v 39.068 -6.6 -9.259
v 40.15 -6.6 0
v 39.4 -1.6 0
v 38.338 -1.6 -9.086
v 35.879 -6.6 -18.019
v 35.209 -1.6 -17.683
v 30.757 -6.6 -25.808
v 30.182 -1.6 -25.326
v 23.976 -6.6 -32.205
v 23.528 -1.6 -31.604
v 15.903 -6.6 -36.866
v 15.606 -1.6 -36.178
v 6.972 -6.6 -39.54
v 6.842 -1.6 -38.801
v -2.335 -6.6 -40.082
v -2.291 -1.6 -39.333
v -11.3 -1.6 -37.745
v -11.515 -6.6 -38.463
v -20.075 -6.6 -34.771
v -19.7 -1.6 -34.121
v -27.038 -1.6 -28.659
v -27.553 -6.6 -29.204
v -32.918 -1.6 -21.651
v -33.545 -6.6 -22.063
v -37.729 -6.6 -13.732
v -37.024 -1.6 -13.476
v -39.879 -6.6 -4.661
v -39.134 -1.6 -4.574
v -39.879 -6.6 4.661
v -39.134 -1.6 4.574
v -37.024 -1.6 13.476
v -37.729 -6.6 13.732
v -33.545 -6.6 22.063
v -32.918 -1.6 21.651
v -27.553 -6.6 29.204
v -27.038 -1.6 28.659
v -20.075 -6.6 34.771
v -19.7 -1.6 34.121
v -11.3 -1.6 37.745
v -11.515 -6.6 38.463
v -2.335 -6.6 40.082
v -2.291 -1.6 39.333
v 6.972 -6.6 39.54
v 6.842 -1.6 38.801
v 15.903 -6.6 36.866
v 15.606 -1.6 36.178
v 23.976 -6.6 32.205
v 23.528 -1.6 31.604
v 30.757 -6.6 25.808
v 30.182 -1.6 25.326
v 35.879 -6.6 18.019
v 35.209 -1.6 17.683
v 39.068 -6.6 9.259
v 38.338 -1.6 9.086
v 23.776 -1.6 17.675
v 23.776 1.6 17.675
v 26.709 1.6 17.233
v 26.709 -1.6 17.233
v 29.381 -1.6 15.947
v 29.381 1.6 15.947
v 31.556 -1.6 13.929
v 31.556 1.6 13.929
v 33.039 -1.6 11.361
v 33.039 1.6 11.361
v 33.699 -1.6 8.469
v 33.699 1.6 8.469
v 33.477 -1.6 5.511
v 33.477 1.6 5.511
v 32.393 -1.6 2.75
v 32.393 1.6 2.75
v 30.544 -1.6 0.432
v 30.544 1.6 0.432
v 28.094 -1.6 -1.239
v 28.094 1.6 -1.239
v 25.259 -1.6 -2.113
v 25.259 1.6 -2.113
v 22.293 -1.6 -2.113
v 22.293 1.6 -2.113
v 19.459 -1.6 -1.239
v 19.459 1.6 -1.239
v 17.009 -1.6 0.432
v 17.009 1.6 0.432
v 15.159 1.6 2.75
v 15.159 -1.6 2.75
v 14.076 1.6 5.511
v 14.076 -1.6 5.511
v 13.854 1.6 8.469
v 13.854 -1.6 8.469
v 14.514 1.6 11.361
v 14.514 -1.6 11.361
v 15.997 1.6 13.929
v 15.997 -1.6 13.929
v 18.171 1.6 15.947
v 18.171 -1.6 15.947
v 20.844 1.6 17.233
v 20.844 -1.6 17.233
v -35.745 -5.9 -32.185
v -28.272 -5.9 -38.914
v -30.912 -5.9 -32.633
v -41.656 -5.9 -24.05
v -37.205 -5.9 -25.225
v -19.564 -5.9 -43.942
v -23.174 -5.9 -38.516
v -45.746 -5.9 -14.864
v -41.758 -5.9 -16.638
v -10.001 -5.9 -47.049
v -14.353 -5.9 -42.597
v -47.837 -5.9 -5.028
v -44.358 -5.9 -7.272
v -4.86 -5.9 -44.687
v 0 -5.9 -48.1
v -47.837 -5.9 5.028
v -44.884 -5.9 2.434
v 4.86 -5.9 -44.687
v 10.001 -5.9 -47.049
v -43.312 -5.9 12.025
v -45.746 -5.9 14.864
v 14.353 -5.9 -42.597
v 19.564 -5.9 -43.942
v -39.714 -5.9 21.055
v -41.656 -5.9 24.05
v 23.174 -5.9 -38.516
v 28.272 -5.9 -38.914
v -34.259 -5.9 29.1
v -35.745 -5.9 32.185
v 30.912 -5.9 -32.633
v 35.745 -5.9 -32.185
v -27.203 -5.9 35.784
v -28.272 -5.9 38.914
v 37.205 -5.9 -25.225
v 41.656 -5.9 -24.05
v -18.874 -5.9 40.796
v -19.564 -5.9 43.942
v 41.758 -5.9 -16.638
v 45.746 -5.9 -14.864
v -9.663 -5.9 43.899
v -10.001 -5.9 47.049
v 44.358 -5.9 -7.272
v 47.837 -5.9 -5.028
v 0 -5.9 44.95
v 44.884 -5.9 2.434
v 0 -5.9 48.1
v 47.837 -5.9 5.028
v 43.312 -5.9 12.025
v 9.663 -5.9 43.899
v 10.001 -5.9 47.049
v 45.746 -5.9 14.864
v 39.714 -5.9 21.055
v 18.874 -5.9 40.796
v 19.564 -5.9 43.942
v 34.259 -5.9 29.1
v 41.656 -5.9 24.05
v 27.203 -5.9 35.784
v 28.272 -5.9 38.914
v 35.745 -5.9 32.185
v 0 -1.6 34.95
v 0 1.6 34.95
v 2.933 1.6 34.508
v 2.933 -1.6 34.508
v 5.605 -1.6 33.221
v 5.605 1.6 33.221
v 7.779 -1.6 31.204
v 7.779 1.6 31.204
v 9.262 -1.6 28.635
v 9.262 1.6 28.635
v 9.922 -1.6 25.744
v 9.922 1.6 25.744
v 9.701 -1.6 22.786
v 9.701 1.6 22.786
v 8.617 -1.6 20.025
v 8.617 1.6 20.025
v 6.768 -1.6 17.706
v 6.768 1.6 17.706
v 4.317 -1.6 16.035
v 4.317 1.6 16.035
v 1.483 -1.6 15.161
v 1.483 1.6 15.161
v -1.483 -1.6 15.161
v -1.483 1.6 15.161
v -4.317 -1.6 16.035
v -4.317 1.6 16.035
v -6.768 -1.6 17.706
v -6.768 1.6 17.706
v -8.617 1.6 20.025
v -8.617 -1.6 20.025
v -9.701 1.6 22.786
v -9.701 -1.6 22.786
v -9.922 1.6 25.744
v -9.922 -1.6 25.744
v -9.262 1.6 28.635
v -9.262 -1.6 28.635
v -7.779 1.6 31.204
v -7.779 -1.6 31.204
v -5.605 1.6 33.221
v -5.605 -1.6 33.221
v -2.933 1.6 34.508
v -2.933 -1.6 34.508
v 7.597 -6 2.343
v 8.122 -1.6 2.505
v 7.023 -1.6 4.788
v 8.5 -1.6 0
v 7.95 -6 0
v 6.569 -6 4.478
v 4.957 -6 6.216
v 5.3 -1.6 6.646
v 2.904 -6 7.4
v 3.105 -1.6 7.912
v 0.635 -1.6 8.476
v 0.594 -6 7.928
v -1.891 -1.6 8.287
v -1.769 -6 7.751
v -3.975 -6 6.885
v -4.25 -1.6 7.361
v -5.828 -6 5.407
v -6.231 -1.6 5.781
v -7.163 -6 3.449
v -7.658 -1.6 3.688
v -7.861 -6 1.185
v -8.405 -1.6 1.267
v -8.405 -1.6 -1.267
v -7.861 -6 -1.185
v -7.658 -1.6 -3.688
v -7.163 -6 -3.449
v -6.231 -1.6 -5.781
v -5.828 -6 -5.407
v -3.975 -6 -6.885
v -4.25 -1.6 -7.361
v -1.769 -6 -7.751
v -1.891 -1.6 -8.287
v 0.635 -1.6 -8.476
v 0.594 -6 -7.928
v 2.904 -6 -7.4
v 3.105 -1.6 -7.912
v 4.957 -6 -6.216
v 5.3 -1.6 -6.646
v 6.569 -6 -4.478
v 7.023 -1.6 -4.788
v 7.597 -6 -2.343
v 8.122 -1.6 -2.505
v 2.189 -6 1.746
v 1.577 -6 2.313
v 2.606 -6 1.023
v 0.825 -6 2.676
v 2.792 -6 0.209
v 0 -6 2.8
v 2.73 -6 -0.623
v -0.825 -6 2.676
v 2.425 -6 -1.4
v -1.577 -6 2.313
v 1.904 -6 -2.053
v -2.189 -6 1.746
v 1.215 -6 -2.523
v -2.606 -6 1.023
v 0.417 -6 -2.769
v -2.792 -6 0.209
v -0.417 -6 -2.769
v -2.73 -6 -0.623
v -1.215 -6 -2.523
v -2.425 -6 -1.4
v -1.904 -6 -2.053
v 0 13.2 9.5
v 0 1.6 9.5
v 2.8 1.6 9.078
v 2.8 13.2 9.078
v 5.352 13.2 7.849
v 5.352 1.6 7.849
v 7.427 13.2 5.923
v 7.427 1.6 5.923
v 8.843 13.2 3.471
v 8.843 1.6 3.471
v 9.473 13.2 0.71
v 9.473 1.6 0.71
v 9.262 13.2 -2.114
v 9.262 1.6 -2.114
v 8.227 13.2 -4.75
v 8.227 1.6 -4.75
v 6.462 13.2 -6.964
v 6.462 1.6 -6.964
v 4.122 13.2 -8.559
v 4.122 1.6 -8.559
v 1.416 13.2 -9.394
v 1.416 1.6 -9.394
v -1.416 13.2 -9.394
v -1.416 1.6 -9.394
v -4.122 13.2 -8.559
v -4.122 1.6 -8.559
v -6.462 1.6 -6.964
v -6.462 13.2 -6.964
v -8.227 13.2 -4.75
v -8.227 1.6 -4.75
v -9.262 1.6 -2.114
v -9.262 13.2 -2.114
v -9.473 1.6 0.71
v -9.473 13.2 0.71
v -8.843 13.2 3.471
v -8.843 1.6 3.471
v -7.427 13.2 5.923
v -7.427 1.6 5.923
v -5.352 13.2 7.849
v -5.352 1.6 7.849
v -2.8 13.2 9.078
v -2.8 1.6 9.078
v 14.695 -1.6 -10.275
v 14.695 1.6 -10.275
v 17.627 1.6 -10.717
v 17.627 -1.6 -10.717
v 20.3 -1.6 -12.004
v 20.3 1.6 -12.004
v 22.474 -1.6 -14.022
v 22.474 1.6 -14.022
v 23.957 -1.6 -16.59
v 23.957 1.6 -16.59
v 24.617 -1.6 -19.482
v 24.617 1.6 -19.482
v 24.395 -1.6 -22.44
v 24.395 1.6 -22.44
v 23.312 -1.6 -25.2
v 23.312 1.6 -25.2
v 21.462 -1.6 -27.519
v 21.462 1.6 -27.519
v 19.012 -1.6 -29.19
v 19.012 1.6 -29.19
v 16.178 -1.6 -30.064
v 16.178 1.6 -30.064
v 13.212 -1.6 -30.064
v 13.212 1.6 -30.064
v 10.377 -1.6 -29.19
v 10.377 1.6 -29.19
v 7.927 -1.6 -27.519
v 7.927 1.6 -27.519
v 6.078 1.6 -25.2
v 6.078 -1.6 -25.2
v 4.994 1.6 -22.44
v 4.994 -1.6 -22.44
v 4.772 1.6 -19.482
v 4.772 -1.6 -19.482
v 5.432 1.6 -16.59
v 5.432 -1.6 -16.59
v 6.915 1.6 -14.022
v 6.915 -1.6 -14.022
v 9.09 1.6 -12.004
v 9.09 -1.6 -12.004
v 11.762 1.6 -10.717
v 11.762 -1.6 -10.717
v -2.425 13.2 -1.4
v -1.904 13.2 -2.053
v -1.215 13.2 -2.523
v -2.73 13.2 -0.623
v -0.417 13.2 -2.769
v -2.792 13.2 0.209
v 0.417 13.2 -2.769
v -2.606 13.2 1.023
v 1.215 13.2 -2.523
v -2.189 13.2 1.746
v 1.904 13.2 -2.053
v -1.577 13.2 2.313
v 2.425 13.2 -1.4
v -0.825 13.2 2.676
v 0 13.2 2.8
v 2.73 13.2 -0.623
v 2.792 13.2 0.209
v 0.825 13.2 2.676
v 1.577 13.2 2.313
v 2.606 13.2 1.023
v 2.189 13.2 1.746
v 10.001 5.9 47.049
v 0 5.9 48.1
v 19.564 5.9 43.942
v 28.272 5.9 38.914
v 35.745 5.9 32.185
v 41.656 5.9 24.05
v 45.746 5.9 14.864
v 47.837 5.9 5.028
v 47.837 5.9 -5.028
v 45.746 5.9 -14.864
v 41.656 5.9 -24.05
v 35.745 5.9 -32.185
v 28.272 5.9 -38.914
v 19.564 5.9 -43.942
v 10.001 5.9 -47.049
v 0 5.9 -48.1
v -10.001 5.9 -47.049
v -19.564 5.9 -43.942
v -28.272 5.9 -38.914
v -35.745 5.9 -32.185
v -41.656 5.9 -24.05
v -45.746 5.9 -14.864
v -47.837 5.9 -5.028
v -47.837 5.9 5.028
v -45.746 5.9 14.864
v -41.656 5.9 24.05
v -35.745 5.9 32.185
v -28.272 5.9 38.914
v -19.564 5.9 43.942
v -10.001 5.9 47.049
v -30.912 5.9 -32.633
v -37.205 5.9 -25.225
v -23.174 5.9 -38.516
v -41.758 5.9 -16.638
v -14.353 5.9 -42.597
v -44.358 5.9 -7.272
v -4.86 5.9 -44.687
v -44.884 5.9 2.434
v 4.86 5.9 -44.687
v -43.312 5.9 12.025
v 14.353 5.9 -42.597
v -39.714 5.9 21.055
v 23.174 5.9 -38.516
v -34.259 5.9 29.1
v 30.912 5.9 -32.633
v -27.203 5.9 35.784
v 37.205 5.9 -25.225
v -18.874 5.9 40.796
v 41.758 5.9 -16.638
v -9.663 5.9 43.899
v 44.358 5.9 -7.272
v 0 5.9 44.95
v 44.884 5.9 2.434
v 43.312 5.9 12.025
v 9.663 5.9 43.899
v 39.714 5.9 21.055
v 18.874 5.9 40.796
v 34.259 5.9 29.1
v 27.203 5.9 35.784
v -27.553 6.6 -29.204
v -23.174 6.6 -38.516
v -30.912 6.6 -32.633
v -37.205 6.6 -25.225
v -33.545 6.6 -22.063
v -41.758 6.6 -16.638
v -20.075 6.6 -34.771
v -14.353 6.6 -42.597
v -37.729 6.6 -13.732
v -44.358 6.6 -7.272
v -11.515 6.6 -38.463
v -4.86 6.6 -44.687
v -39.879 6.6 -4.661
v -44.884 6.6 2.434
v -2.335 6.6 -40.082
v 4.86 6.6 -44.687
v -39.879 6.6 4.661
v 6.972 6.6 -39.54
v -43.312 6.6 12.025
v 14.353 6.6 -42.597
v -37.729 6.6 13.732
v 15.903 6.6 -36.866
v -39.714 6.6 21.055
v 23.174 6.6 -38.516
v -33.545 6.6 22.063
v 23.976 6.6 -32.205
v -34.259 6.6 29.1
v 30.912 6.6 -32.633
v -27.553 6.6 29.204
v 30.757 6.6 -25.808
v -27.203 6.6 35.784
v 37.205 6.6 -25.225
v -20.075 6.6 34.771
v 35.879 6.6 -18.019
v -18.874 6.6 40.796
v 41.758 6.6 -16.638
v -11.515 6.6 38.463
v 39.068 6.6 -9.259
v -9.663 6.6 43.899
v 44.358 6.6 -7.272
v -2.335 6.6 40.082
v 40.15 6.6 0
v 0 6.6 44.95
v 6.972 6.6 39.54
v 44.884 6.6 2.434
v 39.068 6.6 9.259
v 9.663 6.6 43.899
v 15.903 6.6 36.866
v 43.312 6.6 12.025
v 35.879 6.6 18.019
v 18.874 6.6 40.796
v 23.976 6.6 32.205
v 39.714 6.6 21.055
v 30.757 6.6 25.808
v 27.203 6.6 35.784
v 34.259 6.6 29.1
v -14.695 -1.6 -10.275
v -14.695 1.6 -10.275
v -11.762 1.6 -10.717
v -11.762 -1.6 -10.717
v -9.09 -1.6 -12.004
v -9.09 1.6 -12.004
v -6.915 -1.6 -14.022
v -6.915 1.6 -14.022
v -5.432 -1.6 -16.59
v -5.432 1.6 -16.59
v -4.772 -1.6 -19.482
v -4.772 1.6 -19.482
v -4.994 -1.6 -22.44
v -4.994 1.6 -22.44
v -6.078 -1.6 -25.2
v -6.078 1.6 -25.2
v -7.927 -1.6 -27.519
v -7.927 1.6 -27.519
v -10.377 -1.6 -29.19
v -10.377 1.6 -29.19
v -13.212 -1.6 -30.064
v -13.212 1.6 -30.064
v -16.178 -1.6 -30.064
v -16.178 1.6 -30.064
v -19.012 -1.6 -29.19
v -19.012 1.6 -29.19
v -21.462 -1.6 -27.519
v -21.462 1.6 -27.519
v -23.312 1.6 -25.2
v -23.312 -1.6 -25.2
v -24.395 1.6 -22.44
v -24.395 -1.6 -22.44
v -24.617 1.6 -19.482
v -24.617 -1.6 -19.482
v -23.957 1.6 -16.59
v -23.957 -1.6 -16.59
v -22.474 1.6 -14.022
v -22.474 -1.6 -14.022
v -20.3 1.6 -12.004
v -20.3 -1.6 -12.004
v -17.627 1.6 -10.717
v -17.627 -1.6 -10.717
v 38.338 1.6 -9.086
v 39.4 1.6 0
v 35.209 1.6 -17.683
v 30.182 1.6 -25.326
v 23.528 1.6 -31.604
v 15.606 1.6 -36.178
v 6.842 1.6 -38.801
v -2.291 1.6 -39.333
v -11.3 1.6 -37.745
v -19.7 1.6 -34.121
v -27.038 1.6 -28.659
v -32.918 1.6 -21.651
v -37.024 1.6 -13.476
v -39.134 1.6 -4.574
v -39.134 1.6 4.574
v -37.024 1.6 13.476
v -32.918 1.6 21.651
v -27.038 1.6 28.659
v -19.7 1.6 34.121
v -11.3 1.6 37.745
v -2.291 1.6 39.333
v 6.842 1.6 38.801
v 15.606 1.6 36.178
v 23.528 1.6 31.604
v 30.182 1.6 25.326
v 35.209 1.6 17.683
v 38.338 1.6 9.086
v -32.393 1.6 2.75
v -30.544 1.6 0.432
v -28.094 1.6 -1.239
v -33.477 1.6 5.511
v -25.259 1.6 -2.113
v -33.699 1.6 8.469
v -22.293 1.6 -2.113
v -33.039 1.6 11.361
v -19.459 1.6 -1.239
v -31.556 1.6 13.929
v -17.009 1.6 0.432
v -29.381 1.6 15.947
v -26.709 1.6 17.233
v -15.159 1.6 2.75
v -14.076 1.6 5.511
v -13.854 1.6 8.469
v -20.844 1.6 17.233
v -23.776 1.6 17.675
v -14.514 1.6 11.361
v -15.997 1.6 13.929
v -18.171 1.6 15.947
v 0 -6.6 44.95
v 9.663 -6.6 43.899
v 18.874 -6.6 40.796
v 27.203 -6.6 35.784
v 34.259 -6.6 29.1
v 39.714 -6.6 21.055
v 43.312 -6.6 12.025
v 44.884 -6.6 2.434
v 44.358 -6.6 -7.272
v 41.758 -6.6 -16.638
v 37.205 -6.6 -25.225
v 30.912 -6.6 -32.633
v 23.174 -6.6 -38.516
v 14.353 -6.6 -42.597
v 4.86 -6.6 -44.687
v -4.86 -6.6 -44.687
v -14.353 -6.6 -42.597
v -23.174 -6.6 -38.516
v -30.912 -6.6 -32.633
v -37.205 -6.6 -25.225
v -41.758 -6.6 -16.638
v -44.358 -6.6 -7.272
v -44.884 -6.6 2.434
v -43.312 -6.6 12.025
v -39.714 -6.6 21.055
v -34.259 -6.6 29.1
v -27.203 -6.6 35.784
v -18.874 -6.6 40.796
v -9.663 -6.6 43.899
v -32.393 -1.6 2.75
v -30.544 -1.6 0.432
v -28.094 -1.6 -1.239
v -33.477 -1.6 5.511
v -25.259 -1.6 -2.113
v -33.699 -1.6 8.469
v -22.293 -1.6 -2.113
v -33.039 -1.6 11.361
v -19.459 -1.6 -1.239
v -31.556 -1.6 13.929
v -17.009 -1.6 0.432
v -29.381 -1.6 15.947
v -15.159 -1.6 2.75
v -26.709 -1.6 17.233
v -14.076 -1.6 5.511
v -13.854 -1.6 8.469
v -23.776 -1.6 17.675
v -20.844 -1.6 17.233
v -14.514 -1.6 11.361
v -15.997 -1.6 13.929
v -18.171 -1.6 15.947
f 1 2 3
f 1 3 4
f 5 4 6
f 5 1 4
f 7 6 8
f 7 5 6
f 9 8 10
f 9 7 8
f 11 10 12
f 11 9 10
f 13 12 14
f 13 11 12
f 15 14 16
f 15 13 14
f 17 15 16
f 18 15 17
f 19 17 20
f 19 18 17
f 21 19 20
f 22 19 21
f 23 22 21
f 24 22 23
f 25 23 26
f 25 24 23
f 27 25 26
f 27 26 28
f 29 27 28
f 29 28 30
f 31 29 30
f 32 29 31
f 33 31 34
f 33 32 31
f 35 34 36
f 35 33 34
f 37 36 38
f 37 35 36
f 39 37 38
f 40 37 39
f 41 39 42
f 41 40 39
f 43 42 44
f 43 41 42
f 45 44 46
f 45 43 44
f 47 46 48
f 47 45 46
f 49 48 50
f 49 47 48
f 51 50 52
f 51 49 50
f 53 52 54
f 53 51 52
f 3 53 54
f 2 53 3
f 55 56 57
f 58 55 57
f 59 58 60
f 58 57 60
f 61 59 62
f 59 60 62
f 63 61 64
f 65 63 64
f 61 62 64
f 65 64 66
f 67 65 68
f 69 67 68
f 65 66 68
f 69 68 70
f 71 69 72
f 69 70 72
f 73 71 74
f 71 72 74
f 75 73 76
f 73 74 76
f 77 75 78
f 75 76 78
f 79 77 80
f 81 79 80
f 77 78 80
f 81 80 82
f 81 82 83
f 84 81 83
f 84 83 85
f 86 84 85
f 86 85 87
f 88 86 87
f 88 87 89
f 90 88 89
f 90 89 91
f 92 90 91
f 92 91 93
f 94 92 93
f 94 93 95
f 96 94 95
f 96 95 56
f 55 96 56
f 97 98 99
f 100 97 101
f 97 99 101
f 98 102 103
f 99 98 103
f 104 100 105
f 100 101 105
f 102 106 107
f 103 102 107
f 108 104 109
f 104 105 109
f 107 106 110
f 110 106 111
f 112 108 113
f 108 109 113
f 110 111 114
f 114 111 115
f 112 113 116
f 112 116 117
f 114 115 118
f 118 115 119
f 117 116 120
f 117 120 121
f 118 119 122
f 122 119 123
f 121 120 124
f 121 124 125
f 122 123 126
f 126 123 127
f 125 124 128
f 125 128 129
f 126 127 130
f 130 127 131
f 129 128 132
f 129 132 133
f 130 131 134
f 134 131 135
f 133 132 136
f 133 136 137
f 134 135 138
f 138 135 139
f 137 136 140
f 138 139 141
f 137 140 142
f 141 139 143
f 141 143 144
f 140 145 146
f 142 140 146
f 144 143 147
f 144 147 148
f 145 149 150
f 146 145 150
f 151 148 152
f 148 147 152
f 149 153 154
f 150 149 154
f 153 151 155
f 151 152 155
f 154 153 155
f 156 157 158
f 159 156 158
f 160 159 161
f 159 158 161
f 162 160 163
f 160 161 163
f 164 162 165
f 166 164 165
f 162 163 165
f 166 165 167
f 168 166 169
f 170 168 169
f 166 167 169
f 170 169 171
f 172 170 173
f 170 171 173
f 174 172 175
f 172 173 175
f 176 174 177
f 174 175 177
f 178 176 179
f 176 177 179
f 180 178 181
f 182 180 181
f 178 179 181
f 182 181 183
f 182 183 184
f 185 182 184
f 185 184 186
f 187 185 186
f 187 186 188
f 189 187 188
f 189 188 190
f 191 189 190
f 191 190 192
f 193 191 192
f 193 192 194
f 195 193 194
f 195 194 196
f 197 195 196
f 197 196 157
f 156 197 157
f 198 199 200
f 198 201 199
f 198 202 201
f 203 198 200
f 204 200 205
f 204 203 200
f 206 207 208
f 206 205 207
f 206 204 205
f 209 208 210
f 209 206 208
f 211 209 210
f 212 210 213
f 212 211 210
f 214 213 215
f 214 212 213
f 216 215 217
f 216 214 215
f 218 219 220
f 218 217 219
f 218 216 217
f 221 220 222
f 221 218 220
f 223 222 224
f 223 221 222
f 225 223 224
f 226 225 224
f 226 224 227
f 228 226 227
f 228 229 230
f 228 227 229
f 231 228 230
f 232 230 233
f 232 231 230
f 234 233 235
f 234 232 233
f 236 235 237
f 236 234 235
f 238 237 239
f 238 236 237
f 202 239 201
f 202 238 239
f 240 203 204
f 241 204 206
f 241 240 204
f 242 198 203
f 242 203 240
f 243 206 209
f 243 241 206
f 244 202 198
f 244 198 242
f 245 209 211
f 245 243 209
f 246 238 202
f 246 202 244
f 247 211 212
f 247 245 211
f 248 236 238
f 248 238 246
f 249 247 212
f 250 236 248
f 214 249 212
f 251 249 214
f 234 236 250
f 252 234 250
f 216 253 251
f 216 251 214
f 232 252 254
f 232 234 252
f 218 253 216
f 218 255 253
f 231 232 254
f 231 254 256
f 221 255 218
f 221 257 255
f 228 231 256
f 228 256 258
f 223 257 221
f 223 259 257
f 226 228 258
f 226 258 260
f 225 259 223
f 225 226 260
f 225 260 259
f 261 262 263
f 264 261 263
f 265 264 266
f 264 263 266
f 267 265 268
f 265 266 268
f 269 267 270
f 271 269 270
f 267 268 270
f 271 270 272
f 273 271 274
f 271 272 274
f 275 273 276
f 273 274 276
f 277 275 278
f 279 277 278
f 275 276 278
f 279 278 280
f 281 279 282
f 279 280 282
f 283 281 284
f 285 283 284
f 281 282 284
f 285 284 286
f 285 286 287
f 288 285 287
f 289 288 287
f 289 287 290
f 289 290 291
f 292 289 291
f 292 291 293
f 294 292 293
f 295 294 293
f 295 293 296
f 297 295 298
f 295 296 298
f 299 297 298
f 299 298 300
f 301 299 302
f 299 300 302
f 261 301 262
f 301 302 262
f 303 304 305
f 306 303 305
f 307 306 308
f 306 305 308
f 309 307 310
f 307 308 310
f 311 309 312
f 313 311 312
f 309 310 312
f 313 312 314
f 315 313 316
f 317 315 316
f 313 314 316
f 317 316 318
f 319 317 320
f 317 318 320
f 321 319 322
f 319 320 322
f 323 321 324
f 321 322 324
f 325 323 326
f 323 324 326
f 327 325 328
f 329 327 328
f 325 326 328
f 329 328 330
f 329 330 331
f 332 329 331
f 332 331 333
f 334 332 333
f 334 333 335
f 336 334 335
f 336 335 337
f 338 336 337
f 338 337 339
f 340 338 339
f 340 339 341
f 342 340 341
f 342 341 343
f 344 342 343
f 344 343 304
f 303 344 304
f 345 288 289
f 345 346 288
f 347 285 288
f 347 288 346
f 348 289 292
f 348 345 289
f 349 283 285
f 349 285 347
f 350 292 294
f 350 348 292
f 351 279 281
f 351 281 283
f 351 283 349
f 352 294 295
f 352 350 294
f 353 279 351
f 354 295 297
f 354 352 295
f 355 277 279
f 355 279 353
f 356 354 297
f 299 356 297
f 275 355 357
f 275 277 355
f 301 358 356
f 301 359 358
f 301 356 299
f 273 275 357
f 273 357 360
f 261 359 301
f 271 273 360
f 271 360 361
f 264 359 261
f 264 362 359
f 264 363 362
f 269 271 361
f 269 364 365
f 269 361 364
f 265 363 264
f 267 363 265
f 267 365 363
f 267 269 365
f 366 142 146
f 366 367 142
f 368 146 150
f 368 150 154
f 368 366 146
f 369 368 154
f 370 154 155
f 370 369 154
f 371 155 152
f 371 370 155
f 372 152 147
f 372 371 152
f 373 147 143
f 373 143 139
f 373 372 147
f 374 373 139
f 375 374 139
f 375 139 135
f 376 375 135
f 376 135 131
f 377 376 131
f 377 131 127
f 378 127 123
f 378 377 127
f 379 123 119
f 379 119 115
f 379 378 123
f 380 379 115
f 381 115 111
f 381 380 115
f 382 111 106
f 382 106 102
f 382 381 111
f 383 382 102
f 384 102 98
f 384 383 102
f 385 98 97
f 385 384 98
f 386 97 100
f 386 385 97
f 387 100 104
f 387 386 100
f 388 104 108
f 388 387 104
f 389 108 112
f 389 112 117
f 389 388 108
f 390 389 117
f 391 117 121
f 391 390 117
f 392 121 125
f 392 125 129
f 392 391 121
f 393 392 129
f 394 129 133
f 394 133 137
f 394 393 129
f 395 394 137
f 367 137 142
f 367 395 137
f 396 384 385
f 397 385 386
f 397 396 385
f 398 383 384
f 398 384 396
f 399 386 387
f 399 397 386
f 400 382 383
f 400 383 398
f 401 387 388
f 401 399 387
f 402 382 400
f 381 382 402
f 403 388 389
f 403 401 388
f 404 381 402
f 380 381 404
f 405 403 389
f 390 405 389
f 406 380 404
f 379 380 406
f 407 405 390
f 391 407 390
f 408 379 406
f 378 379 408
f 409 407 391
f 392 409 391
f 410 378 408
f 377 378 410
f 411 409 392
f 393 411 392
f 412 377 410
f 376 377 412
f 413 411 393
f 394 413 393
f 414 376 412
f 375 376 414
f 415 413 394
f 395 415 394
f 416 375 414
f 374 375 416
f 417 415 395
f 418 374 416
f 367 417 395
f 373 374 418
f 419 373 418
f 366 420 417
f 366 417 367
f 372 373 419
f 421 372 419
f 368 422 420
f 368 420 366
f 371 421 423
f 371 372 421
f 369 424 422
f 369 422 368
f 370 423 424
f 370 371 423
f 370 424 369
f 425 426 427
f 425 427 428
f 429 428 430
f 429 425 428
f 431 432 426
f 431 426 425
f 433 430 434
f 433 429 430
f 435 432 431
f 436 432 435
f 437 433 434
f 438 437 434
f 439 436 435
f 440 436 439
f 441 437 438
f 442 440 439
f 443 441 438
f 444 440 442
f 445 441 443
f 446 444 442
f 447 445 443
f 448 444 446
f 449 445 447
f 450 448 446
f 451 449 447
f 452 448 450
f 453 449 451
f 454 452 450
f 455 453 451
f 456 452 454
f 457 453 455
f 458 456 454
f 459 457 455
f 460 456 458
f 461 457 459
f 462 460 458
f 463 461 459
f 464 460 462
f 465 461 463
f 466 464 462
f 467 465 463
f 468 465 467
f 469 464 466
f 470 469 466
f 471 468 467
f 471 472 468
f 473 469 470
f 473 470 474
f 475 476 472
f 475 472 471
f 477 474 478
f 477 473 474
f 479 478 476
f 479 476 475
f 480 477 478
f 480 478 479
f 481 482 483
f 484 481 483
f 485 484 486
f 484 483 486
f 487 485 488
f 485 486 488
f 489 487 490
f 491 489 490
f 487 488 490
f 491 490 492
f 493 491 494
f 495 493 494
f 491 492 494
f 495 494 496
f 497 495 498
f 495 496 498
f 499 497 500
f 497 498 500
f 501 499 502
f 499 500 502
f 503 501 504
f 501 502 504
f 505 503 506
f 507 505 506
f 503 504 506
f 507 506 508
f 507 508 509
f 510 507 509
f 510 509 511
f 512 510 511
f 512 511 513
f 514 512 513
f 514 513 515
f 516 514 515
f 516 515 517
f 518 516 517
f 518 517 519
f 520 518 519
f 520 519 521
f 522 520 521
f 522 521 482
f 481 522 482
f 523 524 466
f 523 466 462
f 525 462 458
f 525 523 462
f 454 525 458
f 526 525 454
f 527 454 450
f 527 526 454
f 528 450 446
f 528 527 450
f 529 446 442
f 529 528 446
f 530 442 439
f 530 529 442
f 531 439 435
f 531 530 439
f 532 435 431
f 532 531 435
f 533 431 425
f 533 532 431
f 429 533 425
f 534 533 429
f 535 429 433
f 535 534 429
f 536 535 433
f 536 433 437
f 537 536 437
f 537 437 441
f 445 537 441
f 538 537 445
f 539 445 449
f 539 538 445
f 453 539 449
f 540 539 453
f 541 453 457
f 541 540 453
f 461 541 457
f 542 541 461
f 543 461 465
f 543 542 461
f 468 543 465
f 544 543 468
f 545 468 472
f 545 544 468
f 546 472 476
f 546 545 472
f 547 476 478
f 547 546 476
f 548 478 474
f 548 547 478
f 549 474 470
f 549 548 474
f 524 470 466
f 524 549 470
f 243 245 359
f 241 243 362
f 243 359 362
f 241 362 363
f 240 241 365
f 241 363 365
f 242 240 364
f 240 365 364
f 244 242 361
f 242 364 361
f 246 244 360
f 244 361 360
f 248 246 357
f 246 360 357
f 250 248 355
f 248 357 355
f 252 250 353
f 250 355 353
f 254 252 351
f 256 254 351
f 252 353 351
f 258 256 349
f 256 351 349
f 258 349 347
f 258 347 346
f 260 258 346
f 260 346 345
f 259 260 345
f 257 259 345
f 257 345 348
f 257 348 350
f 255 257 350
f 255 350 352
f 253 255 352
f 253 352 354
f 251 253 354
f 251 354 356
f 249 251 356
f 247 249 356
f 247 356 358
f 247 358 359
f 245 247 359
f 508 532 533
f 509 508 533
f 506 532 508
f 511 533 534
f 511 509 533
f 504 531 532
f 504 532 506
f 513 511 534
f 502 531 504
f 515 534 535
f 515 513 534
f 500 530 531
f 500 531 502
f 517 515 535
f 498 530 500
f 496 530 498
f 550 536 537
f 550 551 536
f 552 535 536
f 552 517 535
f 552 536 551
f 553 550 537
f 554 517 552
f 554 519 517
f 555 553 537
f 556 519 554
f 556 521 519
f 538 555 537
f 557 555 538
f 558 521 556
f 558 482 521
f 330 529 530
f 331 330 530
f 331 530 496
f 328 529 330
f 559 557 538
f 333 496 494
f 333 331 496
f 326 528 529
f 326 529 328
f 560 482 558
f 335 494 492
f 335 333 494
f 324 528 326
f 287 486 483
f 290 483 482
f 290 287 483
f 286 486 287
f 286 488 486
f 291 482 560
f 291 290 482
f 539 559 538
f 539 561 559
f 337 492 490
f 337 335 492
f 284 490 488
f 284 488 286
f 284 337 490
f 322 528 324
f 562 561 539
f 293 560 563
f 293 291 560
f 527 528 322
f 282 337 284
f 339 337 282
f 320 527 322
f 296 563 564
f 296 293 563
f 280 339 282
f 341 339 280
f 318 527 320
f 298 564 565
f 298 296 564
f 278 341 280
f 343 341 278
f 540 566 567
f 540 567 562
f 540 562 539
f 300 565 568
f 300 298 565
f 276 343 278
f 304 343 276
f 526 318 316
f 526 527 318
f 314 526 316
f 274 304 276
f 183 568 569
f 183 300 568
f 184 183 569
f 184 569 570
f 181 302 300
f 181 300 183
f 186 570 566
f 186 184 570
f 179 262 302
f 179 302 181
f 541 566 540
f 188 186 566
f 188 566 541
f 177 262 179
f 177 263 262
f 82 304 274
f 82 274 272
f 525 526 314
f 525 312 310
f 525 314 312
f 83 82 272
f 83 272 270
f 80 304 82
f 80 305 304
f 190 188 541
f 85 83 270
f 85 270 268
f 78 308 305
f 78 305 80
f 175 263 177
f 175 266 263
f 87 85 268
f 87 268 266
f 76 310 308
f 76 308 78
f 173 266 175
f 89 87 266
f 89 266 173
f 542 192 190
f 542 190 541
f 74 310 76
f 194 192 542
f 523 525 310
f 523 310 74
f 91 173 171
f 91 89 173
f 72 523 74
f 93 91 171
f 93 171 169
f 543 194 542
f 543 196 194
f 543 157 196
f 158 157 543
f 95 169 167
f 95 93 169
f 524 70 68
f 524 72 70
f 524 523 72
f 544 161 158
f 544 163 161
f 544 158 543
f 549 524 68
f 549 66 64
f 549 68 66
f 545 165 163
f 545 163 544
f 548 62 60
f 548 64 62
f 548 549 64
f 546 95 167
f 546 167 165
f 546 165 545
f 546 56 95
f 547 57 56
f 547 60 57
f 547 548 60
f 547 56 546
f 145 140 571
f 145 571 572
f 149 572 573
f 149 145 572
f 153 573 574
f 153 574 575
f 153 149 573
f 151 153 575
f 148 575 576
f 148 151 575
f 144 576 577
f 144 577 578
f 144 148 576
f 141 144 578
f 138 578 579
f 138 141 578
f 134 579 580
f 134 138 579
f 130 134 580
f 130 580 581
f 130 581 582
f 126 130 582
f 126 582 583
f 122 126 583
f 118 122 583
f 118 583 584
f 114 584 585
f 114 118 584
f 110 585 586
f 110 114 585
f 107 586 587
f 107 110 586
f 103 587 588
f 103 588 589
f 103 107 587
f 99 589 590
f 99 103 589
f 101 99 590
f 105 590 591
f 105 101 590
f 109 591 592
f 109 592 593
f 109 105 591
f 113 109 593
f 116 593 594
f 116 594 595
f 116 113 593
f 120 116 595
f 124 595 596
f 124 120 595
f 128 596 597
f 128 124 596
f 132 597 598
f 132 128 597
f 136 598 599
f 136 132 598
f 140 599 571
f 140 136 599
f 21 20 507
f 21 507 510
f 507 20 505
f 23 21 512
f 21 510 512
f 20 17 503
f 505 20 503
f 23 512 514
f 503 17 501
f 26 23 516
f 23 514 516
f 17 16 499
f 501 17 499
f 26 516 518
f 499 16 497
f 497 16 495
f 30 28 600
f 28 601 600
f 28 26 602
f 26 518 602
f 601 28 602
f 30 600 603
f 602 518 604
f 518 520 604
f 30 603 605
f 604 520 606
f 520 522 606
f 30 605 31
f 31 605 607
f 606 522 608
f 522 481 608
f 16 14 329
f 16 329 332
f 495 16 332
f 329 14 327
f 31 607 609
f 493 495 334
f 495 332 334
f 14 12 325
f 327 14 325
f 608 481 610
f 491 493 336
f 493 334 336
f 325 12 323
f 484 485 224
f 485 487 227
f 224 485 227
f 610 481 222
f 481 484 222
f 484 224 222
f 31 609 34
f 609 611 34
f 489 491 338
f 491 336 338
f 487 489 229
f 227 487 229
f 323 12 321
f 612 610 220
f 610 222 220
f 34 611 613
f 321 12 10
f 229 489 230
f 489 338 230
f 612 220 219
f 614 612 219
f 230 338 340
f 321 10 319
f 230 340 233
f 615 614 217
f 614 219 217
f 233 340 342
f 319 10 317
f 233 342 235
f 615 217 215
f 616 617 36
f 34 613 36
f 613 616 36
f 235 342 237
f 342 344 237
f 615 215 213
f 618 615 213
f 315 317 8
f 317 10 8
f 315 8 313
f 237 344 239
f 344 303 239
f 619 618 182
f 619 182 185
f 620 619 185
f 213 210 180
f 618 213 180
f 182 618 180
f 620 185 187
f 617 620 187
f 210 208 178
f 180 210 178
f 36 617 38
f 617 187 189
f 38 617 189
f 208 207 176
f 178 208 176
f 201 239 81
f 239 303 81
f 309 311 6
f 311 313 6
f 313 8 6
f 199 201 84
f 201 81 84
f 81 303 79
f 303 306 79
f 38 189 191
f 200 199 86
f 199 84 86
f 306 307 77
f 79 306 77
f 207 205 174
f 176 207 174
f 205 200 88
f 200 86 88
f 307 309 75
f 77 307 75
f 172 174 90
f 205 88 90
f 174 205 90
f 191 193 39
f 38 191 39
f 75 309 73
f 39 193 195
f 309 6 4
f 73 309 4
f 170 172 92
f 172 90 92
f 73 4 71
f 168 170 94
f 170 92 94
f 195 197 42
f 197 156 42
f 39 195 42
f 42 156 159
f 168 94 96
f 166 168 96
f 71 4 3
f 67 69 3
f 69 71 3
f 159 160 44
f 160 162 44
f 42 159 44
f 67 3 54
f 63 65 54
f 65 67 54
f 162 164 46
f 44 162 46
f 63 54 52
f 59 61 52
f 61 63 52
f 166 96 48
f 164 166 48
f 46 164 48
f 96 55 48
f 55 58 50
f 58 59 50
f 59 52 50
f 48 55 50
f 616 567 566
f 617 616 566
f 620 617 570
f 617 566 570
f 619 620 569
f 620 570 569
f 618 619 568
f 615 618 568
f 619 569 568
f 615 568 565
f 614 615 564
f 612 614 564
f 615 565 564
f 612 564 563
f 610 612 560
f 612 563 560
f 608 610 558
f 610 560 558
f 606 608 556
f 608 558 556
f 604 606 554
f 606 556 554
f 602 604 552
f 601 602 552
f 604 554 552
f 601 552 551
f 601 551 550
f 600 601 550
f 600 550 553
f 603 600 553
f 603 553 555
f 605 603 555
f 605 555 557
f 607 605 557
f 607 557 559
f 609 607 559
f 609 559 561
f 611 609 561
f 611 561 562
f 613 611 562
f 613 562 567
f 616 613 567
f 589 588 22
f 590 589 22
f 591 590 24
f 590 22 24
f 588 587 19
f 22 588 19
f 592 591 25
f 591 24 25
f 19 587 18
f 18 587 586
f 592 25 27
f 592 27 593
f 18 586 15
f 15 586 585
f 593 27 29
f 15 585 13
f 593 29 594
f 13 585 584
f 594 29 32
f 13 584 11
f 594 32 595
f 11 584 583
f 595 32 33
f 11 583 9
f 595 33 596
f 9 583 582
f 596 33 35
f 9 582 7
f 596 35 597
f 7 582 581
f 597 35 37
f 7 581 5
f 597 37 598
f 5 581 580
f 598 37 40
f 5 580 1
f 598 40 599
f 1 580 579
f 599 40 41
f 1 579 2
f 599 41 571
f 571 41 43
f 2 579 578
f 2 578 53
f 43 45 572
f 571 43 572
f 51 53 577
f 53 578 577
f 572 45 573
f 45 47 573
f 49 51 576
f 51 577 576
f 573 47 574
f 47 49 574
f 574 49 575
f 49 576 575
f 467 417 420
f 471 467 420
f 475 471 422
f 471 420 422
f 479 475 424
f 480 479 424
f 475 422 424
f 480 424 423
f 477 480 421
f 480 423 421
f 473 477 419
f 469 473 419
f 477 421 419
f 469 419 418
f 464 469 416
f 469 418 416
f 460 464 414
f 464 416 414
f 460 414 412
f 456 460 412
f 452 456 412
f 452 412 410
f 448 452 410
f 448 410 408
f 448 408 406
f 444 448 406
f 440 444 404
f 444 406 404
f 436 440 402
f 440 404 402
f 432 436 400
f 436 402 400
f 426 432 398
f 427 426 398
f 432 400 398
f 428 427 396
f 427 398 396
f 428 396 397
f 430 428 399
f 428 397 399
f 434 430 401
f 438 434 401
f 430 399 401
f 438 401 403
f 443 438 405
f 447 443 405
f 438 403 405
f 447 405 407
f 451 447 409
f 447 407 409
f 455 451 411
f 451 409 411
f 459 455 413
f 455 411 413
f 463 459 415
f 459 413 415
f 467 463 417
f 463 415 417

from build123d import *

# Parameters (mm, degrees)
SKETCH1_R           = 48.1
BOSS_EXTRUDE2_DEPTH = 5.9
SKETCH2_R           = 44.95
BOSS_EXTRUDE3_DEPTH = 0.7
SKETCH5_R           = 40.15
CUT_EXTRUDE1_DEPTH  = 5
SKETCH8_R           = 9.95
CUT_EXTRUDE2_DEPTH  = 69.516129488
SKETCH8_4_R         = 9.5
BOSS_EXTRUDE4_DEPTH = 11.6
SKETCH9_R           = 8.5
SKETCH10_R          = 7.95
CUT_EXTRUDE3_REACH  = 72.847
SKETCH11_R          = 2.8


# Read off the part's stored shape, not the designer's step: Loft2, Loft3
with BuildPart() as part:
    # Sketch1 → Boss-Extrude2 (new body)
    with BuildSketch(Plane(origin=(0, 0, 0), x_dir=(1, 0, 0), z_dir=(0, 1, 0))):
        with Locations(Location((0, 0, 0), (0, 0, 270))):
            Circle(SKETCH1_R)
    boss_extrude2 = extrude(amount=BOSS_EXTRUDE2_DEPTH)

    # Sketch2 → Boss-Extrude3 (add)
    with BuildSketch(Plane(origin=(0, 5.9, 0), x_dir=(1, 0, 0), z_dir=(0, 1, 0))):
        with Locations(Location((0, 0, 0), (0, 0, 270))):
            Circle(SKETCH2_R)
    boss_extrude3 = extrude(amount=BOSS_EXTRUDE3_DEPTH)

    # Sketch5 → Cut-Extrude1 (cut)
    with BuildSketch(Plane(origin=(0, 6.6, 0), x_dir=(1, 0, 0), z_dir=(0, 1, 0))):
        with Locations(Location((0, 0, 0), (0, 0, 270))):
            Circle(SKETCH5_R)
    cut_extrude1 = extrude(amount=-CUT_EXTRUDE1_DEPTH, mode=Mode.SUBTRACT)

    # Loft2 outline → Loft2 (revolve)
    with BuildSketch(Plane.XY):
        Polygon((40.15, 6.6), (39.4, 1.6), (40.15, 1.6), align=None)
    revolve(axis=Axis((0, 0, 0), (0, 1, 0)))

    # Mirror2: Boss-Extrude2, Boss-Extrude3, Cut-Extrude1 across Top Plane
    add(boss_extrude2.mirror(Plane(origin=(0, 0, 0), x_dir=(1, 0, 0), z_dir=(0, 1, 0))))
    add(boss_extrude3.mirror(Plane(origin=(0, 0, 0), x_dir=(1, 0, 0), z_dir=(0, 1, 0))))
    add(cut_extrude1.mirror(Plane(origin=(0, 0, 0), x_dir=(1, 0, 0), z_dir=(0, 1, 0))), mode=Mode.SUBTRACT)

    # Loft3 outline → Loft3 (revolve)
    with BuildSketch(Plane.XY):
        Polygon((40.15, -1.6), (39.4, -1.6), (40.15, -6.6), align=None)
    revolve(axis=Axis((0, 0, 0), (0, 1, 0)))

    # Sketch8 → Cut-Extrude2 (cut, through all)
    with BuildSketch(Plane(origin=(0, 1.6, 0), x_dir=(1, 0, 0), z_dir=(0, 1, 0))):
        with Locations(Location((0, -25, 0), (0, 0, 270))):
            Circle(SKETCH8_R)
        with Locations(Location((-23.776412907, -7.725424859, 0), (0, 0, 270))):
            Circle(SKETCH8_R)
        with Locations(Location((-14.694631307, 20.225424859, 0), (0, 0, 270))):
            Circle(SKETCH8_R)
        with Locations(Location((14.694631307, 20.225424859, 0), (0, 0, 270))):
            Circle(SKETCH8_R)
        with Locations(Location((23.776412907, -7.725424859, 0), (0, 0, 270))):
            Circle(SKETCH8_R)
    extrude(amount=-CUT_EXTRUDE2_DEPTH, mode=Mode.SUBTRACT)

    # Sketch8<4> → Boss-Extrude4 (add)
    with BuildSketch(Plane(origin=(0, 1.6, 0), x_dir=(1, 0, 0), z_dir=(0, 1, 0))):
        with Locations(Location((0, 0, 0), (0, 0, 270))):
            Circle(SKETCH8_4_R)
    extrude(amount=BOSS_EXTRUDE4_DEPTH)

    # Sketch9 → Loft4 section 0
    with BuildSketch(Plane.XZ.offset(1.6)):
        Circle(SKETCH9_R)
    # Sketch10 → Loft4 section 1
    with BuildSketch(Plane(origin=(0, -6, 0), x_dir=(-1, 0, 0), z_dir=(0, -1, 0))):
        Circle(SKETCH10_R)
    loft()

    # Sketch11 → Cut-Extrude3 (cut, up to next)
    with BuildSketch(Plane(origin=(0, 13.2, 0), x_dir=(1, 0, 0), z_dir=(0, 1, 0)), mode=Mode.PRIVATE) as cut_extrude3_sk1:
        with Locations(Location((0, 0, 0), (0, 0, 270))):
            Circle(SKETCH11_R)
    cut_extrude3_tool1 = extrude(cut_extrude3_sk1.sketch, amount=-CUT_EXTRUDE3_REACH, mode=Mode.PRIVATE) & part.part
    add(cut_extrude3_tool1.solids().sort_by_distance((0, 13.2, 0))[0], mode=Mode.SUBTRACT)


solid = part.part
